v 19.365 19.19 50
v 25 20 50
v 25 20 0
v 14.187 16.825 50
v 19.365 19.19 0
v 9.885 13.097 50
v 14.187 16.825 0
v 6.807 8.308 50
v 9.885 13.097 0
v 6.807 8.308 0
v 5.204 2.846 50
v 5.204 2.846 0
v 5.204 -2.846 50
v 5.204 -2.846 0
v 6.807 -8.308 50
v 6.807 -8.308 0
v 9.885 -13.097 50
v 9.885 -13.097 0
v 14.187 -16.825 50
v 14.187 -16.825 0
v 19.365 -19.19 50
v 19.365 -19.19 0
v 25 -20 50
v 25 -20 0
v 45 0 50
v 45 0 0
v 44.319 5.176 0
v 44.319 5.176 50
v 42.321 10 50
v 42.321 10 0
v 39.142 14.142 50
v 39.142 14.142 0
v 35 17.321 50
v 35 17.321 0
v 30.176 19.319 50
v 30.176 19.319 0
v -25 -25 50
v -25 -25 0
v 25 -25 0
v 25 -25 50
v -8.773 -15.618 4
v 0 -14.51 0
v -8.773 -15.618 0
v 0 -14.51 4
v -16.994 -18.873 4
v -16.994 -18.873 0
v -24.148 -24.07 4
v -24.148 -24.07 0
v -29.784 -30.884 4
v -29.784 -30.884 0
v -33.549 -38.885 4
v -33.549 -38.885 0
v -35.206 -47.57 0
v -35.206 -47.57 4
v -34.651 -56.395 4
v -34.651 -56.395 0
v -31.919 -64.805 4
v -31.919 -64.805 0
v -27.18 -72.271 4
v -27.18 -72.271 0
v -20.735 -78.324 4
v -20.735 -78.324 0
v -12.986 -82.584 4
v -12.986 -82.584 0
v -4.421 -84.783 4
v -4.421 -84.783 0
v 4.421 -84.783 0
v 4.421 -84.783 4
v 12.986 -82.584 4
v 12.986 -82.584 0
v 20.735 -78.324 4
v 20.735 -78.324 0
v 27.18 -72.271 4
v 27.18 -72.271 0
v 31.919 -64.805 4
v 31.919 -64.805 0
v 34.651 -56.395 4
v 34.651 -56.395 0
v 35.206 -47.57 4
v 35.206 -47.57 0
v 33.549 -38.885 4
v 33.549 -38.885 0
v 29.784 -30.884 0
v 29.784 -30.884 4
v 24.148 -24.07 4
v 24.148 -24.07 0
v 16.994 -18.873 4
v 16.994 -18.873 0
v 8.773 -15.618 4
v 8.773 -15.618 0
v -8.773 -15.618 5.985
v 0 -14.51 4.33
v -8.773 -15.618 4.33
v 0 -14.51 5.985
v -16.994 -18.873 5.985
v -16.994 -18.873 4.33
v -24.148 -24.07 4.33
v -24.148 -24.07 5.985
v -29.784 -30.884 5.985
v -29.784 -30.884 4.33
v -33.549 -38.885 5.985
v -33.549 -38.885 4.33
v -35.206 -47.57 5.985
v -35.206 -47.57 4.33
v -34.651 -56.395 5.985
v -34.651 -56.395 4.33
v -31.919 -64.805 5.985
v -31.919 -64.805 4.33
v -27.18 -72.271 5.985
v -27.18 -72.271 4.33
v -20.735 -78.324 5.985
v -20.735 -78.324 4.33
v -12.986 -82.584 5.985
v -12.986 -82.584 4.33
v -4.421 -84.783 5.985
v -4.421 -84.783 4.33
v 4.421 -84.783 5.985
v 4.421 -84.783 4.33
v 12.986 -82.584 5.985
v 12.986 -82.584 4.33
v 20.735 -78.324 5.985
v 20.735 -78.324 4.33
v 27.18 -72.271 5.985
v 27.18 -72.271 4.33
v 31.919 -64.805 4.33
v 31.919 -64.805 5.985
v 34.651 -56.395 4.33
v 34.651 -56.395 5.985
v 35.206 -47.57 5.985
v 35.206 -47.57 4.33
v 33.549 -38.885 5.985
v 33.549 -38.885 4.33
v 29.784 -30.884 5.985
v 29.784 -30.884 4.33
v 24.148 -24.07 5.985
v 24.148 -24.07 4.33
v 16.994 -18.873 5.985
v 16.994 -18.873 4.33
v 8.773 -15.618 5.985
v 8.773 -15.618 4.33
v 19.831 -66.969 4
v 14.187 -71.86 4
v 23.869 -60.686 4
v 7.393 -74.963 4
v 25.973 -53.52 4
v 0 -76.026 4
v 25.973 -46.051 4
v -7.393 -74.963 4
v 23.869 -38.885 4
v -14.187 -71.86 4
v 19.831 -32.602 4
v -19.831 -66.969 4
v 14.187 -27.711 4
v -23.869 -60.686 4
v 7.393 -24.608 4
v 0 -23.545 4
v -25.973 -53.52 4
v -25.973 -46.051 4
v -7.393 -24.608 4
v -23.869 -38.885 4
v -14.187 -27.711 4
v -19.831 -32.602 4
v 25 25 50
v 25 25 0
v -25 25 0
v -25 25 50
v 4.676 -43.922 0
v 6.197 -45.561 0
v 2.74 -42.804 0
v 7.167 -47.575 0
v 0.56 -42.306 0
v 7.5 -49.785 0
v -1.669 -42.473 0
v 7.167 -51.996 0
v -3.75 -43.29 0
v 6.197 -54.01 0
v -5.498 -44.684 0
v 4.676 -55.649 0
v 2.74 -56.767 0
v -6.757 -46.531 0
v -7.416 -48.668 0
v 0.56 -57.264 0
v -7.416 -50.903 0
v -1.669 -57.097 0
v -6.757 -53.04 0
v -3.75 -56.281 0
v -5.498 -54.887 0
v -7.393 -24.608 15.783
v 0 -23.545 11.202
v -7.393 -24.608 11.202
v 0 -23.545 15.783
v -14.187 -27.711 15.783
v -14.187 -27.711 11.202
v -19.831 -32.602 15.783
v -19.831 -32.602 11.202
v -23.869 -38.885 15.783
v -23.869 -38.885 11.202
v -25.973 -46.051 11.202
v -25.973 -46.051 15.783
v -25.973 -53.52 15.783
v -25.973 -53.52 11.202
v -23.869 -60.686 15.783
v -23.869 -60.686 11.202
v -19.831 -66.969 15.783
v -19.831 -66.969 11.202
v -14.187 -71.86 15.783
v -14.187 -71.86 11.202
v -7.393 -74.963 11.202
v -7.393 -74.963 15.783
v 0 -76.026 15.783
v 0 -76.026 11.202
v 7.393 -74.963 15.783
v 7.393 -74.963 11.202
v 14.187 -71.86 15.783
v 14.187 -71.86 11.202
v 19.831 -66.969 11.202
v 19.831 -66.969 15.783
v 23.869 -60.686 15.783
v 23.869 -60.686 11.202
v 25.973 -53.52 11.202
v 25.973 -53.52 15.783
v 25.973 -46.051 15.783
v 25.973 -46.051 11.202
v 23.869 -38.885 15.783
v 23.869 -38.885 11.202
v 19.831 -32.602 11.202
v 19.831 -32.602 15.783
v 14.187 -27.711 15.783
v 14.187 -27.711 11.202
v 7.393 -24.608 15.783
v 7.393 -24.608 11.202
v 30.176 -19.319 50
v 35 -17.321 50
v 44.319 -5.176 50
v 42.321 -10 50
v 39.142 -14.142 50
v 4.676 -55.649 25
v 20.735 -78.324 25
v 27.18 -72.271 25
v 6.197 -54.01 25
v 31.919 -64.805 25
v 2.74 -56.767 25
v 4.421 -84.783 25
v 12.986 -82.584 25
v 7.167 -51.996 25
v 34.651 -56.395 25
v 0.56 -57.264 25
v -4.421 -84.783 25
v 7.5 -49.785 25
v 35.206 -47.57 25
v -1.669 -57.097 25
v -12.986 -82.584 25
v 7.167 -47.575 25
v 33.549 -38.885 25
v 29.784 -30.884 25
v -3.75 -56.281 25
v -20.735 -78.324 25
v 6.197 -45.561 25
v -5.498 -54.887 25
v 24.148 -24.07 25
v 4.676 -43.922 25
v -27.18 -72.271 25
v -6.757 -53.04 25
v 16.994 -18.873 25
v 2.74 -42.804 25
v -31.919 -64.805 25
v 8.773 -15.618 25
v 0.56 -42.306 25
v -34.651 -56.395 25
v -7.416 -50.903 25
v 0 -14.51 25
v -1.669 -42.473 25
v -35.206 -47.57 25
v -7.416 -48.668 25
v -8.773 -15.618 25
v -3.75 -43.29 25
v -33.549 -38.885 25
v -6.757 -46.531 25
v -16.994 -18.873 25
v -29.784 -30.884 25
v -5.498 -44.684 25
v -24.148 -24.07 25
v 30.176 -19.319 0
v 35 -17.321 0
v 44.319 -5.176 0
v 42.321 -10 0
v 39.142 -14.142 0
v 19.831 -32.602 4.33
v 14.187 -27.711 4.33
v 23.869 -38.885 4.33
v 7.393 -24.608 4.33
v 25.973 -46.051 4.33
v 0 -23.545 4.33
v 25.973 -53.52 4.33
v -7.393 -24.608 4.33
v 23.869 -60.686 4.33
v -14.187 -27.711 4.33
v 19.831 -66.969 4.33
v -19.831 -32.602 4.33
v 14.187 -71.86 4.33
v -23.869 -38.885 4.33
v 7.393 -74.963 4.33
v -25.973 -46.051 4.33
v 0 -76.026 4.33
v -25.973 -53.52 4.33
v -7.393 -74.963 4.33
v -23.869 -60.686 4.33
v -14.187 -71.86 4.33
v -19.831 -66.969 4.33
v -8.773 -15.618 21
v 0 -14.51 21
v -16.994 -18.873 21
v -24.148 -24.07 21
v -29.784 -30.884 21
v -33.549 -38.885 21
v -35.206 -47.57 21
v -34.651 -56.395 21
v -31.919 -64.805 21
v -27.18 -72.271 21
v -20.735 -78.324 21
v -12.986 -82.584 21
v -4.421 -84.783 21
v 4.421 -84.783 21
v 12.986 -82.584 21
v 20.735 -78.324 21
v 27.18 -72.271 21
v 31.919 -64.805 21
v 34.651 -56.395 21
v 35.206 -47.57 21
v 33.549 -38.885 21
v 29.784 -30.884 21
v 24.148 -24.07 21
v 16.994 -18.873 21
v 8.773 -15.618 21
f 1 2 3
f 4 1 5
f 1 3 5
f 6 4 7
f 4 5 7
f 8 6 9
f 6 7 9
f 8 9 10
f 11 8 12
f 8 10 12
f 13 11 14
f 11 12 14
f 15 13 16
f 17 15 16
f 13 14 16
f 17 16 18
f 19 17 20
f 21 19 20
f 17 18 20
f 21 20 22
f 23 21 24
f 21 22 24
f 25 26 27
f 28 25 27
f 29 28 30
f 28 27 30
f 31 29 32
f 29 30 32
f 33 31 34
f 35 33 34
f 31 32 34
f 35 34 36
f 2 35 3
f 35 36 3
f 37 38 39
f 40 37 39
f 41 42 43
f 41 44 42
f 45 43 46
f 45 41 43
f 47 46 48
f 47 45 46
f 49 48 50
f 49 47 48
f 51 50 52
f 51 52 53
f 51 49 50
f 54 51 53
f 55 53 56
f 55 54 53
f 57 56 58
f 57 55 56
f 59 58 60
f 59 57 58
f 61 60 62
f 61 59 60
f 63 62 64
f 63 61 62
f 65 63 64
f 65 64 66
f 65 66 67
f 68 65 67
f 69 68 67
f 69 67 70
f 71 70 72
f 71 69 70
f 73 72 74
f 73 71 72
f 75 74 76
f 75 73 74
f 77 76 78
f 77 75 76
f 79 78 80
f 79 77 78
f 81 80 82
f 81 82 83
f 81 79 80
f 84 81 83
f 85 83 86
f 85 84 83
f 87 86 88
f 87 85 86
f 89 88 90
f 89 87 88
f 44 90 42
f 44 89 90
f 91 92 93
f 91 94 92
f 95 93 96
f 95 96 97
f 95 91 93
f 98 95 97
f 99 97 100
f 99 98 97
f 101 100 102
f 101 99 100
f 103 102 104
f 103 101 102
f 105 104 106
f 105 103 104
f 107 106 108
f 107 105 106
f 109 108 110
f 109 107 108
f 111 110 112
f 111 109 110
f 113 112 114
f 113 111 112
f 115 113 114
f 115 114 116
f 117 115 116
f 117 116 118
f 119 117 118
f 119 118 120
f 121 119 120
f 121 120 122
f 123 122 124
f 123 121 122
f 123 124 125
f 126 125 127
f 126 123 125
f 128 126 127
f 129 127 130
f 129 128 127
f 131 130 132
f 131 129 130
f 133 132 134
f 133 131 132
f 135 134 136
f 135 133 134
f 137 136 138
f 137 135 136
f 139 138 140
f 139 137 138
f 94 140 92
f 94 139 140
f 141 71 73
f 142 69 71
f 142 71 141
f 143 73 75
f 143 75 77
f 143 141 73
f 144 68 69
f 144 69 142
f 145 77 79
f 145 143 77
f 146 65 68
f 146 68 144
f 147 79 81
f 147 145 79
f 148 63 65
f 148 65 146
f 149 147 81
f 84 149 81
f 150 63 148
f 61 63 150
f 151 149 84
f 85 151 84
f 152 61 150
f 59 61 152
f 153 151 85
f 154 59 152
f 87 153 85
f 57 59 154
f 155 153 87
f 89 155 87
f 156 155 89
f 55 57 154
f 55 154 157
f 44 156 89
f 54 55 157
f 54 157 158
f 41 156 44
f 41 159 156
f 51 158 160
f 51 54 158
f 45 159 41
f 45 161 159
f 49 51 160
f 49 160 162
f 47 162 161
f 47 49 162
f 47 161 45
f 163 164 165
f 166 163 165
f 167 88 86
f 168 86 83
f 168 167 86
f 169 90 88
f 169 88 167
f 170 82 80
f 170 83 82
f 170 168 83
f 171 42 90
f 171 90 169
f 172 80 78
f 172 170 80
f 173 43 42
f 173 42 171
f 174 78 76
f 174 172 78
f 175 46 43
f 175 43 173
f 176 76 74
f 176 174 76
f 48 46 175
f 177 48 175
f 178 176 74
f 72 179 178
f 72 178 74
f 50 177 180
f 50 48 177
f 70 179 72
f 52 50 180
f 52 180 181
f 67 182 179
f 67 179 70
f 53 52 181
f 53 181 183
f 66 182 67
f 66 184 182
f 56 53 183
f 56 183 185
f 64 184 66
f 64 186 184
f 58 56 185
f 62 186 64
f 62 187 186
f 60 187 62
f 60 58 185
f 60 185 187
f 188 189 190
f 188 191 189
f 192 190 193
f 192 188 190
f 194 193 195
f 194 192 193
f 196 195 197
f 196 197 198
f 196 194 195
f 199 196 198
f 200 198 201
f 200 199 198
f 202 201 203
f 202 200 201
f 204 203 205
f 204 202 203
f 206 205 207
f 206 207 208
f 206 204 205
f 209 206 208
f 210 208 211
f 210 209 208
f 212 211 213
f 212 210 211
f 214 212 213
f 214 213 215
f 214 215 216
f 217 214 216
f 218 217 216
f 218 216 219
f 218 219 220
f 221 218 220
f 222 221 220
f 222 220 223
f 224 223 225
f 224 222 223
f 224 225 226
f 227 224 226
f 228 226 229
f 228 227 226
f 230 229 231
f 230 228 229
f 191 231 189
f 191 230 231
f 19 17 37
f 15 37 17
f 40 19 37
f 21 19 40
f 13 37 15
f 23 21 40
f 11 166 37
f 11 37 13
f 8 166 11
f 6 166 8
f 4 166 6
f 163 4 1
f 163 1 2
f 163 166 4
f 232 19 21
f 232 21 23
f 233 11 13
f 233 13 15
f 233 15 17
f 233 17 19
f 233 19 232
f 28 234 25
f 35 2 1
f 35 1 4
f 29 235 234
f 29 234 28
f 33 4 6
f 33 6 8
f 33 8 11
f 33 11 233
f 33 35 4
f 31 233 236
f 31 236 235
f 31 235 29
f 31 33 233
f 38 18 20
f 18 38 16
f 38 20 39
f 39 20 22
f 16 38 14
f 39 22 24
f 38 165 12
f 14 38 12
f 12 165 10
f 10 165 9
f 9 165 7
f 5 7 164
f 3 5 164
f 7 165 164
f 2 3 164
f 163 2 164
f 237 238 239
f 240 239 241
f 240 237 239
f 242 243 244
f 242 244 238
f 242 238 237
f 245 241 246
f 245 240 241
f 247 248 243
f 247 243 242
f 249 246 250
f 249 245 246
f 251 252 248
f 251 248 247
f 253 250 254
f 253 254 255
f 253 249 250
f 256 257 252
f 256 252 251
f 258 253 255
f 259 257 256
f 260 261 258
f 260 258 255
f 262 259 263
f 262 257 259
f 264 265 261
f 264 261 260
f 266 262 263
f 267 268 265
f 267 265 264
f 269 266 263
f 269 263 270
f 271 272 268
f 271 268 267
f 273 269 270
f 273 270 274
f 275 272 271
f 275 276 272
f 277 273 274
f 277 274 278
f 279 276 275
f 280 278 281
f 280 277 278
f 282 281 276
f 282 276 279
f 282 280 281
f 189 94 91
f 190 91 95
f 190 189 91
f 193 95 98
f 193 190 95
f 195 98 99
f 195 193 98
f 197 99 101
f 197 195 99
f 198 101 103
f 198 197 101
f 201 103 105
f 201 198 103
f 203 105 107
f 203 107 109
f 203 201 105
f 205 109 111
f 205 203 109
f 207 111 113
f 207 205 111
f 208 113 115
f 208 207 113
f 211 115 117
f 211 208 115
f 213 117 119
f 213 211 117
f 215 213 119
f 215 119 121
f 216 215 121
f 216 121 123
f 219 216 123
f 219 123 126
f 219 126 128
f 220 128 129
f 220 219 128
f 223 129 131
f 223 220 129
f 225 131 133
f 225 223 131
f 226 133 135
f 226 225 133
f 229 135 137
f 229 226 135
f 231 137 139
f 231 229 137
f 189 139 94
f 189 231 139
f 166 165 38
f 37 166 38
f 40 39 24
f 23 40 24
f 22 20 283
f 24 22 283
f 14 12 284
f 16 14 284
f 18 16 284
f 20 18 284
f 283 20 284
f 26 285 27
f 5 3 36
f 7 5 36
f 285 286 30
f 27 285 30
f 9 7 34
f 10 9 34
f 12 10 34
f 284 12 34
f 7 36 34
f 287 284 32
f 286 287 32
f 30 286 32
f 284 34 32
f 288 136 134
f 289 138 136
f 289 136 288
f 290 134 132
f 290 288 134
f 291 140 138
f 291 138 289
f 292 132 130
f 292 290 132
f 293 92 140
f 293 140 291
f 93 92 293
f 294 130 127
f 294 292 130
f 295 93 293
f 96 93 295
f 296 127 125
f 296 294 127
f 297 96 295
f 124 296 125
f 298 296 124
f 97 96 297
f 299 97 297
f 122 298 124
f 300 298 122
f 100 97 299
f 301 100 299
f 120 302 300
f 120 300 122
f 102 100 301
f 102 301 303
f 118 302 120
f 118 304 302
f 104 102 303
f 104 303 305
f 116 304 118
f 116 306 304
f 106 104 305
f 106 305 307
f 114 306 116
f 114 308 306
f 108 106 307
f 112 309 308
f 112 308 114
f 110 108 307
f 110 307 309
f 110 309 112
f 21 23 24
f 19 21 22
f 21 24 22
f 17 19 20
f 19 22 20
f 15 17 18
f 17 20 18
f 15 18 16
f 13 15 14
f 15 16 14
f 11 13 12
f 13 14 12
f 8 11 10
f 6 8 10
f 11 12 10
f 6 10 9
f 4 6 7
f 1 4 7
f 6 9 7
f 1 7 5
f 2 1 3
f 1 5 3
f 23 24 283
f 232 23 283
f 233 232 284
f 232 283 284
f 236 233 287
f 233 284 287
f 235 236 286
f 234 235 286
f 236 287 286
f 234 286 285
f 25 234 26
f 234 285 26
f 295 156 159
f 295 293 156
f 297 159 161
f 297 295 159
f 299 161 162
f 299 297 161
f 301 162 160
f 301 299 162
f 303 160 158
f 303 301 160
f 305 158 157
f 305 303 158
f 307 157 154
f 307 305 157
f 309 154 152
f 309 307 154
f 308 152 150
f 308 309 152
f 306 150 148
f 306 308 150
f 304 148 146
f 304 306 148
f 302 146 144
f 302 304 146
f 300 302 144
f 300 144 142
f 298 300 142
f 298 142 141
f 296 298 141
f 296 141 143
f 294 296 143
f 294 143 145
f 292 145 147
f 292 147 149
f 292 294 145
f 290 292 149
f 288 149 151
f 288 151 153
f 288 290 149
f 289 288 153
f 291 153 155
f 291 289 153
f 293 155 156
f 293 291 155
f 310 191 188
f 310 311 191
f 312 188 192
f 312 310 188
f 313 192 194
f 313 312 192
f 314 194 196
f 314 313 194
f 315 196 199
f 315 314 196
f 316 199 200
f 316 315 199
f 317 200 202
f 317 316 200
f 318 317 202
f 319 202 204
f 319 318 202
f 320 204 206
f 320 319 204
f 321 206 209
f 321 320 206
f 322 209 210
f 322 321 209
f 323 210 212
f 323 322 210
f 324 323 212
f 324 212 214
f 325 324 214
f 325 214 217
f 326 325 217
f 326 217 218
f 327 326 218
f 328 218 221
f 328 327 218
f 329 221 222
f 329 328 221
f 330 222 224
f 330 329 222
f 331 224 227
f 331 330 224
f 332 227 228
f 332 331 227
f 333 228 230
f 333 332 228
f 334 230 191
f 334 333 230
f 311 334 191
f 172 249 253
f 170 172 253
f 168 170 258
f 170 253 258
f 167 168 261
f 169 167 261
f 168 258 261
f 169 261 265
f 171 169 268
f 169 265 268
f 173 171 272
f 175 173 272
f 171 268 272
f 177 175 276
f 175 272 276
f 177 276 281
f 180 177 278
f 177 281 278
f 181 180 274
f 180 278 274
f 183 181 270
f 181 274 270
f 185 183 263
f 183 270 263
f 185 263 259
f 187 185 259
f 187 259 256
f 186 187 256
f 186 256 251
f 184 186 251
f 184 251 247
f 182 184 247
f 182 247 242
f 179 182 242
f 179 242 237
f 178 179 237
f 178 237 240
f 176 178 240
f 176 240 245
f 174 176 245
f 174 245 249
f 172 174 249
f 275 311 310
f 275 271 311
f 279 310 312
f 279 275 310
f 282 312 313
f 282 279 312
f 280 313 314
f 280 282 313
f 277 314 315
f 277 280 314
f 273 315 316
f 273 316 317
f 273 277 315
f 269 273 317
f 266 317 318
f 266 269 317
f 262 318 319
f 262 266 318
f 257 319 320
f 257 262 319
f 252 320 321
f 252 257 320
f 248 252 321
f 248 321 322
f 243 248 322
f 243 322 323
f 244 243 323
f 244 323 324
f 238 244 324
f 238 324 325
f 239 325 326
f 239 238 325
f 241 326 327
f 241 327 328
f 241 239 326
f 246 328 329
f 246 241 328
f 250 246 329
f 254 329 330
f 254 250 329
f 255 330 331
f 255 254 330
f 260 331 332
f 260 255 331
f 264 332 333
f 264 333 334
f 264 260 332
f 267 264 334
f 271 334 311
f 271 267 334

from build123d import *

# Parameters (mm, degrees)
F1_DEPTH = 50
F2_DEPTH = 50
F5_R     = 7.5
F6_DEPTH = 25.001


with BuildPart() as f1:
    # F0 (on Top) → F1 (new body)
    with BuildSketch(Plane.XY):
        with BuildLine():
            Line((25, 25), (-25, 25))
            Line((-25, 25), (-25, -25))
            Line((-25, -25), (25, -25))
            Line((25, -25), (25, -20))
            ThreePointArc((25, -20), (5, 0), (25, 20))
            Line((25, 20), (25, 25))
        make_face()
    extrude(amount=F1_DEPTH)


with BuildPart() as f2:
    # F0 (on Top) → F2 (new body)
    with BuildSketch(Plane.XY):
        with BuildLine():
            Line((25, -20), (25, 20))
            ThreePointArc((25, 20), (5, 0), (25, -20))
        make_face()
        with BuildLine():
            ThreePointArc((45, 0), (39.1421356237, 14.1421356237), (25, 20))
            Line((25, 20), (25, -20))
            ThreePointArc((25, -20), (39.1421356237, -14.1421356237), (45, 0))
        make_face()
    extrude(amount=F2_DEPTH)


with BuildPart() as f4:
    # F3 (on Right) → F4 (revolve)
    with BuildSketch(Plane.YZ):
        Polygon((-49.78545174, 0), (-14.5096211135, 0), (-14.5096211135, 4), (-23.5452078595, 4), (-23.5452078595, 4.3302592875), (-14.5096211135, 4.3302592875), (-14.5096211135, 5.9853854659), (-23.5452078595, 11.2020839059), (-23.5452078595, 15.78330156), (-14.5096211135, 21), (-14.5096211135, 25), (-49.78545174, 25), align=None)
    revolve(axis=Axis((0, -49.78545174, 12.5), (0, 0, 1)))

    # F5 (on face) → F6 (cut, through all)
    with BuildSketch(Plane.XY.offset(25)):
        with Locations((0, -49.78545174)):
            Circle(F5_R)
    extrude(amount=-F6_DEPTH, mode=Mode.SUBTRACT)


solid = Compound([f1.part, f2.part, f4.part])
